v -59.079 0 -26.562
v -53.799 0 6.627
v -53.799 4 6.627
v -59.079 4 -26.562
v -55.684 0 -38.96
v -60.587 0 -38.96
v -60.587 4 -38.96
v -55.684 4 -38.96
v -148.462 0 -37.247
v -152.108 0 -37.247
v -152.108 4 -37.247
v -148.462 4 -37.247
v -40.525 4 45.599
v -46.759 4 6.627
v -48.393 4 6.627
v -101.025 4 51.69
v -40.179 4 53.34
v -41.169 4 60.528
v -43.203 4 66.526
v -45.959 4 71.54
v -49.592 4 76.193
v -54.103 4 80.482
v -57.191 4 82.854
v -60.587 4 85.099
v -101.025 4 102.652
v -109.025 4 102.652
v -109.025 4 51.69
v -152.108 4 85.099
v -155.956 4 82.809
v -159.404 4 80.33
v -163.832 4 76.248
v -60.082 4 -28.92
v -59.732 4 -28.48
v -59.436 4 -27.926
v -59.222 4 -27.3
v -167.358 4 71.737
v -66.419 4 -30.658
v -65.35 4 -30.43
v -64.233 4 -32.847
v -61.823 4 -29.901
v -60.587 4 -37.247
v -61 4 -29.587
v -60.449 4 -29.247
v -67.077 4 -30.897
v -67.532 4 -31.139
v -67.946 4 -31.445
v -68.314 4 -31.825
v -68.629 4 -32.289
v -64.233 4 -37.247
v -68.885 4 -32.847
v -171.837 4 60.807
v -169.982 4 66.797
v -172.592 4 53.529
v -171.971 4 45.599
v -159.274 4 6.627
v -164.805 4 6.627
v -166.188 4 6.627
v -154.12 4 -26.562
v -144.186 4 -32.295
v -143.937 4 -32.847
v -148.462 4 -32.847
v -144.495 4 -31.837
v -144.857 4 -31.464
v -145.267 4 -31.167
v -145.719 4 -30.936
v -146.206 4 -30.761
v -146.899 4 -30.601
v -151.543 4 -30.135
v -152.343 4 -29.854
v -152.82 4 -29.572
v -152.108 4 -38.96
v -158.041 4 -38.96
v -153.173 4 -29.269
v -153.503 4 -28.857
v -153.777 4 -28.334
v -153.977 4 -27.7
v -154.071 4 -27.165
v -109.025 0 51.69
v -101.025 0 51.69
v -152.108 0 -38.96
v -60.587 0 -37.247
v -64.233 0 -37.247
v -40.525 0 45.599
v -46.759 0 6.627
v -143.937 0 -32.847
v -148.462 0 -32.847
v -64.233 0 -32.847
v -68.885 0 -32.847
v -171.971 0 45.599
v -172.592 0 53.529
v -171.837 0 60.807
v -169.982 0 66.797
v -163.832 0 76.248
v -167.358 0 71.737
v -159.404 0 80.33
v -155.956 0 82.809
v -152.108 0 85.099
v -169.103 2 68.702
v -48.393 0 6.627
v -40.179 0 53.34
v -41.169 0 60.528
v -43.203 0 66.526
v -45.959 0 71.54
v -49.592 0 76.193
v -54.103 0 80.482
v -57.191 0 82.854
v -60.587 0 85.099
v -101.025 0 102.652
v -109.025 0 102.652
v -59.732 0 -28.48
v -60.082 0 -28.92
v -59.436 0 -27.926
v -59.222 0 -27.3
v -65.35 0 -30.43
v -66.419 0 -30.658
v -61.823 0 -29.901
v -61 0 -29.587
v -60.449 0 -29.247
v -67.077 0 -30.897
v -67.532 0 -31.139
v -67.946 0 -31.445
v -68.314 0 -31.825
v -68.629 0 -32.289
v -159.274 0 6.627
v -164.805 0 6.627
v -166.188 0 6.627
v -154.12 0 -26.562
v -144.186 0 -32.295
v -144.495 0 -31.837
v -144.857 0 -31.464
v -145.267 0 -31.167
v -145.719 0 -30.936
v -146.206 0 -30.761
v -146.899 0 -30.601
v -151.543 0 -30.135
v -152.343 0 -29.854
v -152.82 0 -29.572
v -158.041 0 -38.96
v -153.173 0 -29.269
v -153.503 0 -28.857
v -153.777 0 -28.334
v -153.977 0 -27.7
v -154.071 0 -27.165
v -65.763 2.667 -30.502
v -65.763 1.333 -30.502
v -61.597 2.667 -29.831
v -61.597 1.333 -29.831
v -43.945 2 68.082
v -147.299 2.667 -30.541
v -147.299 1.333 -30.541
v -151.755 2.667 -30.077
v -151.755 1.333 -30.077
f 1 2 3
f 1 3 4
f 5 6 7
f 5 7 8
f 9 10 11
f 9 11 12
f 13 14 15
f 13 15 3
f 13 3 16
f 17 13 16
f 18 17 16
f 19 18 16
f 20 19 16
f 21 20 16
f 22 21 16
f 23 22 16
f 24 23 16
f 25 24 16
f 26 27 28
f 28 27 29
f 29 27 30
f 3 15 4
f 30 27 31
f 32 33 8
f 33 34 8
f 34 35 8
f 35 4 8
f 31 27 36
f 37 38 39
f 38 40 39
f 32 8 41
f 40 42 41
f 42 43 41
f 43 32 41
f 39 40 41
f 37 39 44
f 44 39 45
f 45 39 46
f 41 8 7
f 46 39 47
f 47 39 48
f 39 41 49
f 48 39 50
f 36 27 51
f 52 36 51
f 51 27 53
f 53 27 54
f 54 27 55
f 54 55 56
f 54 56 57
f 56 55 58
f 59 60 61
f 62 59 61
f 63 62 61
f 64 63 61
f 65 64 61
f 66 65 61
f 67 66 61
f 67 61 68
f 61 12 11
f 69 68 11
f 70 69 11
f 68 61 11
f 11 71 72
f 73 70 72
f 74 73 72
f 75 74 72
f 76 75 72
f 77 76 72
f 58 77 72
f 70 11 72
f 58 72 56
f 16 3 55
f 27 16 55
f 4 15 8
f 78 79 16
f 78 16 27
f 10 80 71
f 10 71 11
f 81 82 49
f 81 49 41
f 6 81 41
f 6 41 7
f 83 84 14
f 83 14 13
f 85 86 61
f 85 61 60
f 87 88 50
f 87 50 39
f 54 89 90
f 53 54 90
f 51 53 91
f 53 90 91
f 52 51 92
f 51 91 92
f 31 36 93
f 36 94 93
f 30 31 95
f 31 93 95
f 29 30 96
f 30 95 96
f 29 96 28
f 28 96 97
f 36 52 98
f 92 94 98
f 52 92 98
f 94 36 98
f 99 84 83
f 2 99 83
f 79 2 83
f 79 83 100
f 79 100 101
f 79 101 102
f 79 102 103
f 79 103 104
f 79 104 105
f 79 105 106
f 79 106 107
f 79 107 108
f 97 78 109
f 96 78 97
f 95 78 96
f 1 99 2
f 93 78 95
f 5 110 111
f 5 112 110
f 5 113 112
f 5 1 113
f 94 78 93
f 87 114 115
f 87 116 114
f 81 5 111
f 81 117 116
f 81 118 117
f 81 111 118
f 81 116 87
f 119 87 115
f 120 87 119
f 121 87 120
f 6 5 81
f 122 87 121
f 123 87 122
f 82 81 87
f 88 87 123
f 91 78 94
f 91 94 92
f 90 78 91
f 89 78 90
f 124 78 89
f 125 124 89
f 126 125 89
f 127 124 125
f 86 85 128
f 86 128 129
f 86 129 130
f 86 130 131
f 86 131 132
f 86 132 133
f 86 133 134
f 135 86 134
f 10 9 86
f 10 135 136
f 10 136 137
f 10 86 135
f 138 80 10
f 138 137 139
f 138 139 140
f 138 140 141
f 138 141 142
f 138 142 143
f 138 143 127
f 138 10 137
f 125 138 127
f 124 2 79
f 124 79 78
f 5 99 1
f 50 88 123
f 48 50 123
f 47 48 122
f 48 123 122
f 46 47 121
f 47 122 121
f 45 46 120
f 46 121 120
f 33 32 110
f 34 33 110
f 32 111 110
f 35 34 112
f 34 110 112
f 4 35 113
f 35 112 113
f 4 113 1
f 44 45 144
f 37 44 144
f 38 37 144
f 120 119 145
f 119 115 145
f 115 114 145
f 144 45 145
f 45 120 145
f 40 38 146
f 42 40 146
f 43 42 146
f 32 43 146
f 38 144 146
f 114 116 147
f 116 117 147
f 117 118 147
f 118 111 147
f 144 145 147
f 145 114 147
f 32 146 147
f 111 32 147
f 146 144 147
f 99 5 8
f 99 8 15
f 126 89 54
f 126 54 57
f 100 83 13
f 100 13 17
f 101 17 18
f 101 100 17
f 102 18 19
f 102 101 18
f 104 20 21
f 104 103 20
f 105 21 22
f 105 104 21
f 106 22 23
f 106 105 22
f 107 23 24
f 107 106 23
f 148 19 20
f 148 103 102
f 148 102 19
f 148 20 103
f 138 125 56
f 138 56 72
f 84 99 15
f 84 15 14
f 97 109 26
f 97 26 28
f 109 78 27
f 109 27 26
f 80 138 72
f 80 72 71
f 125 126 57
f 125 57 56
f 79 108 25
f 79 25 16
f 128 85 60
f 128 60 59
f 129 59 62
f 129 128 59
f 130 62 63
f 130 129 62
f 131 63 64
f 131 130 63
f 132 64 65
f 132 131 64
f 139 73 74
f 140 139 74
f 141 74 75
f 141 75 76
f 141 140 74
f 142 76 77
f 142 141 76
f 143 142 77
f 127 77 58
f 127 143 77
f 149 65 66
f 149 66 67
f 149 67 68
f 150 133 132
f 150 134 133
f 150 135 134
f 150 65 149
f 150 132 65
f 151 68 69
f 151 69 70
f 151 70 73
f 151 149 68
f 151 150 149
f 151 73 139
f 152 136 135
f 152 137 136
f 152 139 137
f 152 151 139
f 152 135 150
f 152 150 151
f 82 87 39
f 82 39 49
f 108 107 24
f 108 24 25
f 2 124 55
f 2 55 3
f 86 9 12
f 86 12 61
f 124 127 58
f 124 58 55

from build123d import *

# Parameters (mm, degrees)
EXTRUDE_1_DEPTH = 4


with BuildPart() as part:
    # 草图1 → 凸台-拉伸1 (new body)
    with BuildSketch(Plane(origin=(0, 0, 0), x_dir=(1, 0, 0), z_dir=(0, 1, 0))):
        with BuildLine():
            Line((-171.971094603, -45.598997709), (-166.188191845, -6.627261728))
            Line((-166.188191845, -6.627261728), (-164.805323794, -6.627261728))
            Line((-164.805323794, -6.627261728), (-158.040783066, 38.959860567))
            Line((-158.040783066, 38.959860567), (-152.108080781, 38.959860567))
            Line((-152.108080781, 38.959860567), (-152.108080781, 37.24737007))
            Line((-152.108080781, 37.24737007), (-148.462337738, 37.24737007))
            Line((-148.462337738, 37.24737007), (-148.462337738, 32.847335362))
            Line((-148.462337738, 32.847335362), (-143.936587753, 32.847335362))
            add(Edge.make_bspline(
                [(-143.936587753, 32.847335362), (-145.689971567, 27.988679884), (-153.862596813, 33.234755139), (-154.119525219, 26.561571494)],
                knots=[0, 0, 0, 0, 1, 1, 1, 1], degree=3))
            Line((-154.119525219, 26.561571494), (-159.27385159, -6.627261728))
            Line((-159.27385159, -6.627261728), (-53.798733888, -6.627261728))
            Line((-53.798733888, -6.627261728), (-59.078775537, 26.561571494))
            add(Edge.make_bspline(
                [(-68.884567171, 32.847335362), (-67.18347063, 28.238626072), (-59.875334598, 32.556519598), (-59.078775537, 26.561571494)],
                knots=[0, 0, 0, 0, 1, 1, 1, 1], degree=3))
            Line((-68.884567171, 32.847335362), (-64.233101908, 32.847335362))
            Line((-64.233101908, 32.847335362), (-64.233101908, 37.24737007))
            Line((-64.233101908, 37.24737007), (-60.587358865, 37.24737007))
            Line((-60.587358865, 37.24737007), (-60.587358865, 38.959860567))
            Line((-60.587358865, 38.959860567), (-55.684463048, 38.959860567))
            Line((-55.684463048, 38.959860567), (-48.392976961, -6.627261728))
            Line((-48.392976961, -6.627261728), (-46.758678356, -6.627261728))
            Line((-46.758678356, -6.627261728), (-40.525298042, -45.598997709))
            add(Edge.make_bspline(
                [(-40.525298042, -45.598997709), (-37.332682932, -70.815101754), (-60.587358865, -85.098918409)],
                knots=[0, 0, 0, 1, 1, 1], degree=2))
            Line((-60.587358865, -85.098918409), (-101.024567621, -102.65158724))
            Line((-101.024567621, -102.65158724), (-101.024567621, -51.689651756))
            Line((-101.024567621, -51.689651756), (-109.024567621, -51.689651756))
            Line((-109.024567621, -51.689651756), (-109.024567621, -102.65158724))
            Line((-109.024567621, -102.65158724), (-152.108080781, -85.098918409))
            add(Edge.make_bspline(
                [(-171.971094603, -45.598997709), (-176.165938526, -72.054975501), (-152.108080781, -85.098918409)],
                knots=[0, 0, 0, 1, 1, 1], degree=2))
        make_face()
    extrude(amount=EXTRUDE_1_DEPTH)


solid = part.part
